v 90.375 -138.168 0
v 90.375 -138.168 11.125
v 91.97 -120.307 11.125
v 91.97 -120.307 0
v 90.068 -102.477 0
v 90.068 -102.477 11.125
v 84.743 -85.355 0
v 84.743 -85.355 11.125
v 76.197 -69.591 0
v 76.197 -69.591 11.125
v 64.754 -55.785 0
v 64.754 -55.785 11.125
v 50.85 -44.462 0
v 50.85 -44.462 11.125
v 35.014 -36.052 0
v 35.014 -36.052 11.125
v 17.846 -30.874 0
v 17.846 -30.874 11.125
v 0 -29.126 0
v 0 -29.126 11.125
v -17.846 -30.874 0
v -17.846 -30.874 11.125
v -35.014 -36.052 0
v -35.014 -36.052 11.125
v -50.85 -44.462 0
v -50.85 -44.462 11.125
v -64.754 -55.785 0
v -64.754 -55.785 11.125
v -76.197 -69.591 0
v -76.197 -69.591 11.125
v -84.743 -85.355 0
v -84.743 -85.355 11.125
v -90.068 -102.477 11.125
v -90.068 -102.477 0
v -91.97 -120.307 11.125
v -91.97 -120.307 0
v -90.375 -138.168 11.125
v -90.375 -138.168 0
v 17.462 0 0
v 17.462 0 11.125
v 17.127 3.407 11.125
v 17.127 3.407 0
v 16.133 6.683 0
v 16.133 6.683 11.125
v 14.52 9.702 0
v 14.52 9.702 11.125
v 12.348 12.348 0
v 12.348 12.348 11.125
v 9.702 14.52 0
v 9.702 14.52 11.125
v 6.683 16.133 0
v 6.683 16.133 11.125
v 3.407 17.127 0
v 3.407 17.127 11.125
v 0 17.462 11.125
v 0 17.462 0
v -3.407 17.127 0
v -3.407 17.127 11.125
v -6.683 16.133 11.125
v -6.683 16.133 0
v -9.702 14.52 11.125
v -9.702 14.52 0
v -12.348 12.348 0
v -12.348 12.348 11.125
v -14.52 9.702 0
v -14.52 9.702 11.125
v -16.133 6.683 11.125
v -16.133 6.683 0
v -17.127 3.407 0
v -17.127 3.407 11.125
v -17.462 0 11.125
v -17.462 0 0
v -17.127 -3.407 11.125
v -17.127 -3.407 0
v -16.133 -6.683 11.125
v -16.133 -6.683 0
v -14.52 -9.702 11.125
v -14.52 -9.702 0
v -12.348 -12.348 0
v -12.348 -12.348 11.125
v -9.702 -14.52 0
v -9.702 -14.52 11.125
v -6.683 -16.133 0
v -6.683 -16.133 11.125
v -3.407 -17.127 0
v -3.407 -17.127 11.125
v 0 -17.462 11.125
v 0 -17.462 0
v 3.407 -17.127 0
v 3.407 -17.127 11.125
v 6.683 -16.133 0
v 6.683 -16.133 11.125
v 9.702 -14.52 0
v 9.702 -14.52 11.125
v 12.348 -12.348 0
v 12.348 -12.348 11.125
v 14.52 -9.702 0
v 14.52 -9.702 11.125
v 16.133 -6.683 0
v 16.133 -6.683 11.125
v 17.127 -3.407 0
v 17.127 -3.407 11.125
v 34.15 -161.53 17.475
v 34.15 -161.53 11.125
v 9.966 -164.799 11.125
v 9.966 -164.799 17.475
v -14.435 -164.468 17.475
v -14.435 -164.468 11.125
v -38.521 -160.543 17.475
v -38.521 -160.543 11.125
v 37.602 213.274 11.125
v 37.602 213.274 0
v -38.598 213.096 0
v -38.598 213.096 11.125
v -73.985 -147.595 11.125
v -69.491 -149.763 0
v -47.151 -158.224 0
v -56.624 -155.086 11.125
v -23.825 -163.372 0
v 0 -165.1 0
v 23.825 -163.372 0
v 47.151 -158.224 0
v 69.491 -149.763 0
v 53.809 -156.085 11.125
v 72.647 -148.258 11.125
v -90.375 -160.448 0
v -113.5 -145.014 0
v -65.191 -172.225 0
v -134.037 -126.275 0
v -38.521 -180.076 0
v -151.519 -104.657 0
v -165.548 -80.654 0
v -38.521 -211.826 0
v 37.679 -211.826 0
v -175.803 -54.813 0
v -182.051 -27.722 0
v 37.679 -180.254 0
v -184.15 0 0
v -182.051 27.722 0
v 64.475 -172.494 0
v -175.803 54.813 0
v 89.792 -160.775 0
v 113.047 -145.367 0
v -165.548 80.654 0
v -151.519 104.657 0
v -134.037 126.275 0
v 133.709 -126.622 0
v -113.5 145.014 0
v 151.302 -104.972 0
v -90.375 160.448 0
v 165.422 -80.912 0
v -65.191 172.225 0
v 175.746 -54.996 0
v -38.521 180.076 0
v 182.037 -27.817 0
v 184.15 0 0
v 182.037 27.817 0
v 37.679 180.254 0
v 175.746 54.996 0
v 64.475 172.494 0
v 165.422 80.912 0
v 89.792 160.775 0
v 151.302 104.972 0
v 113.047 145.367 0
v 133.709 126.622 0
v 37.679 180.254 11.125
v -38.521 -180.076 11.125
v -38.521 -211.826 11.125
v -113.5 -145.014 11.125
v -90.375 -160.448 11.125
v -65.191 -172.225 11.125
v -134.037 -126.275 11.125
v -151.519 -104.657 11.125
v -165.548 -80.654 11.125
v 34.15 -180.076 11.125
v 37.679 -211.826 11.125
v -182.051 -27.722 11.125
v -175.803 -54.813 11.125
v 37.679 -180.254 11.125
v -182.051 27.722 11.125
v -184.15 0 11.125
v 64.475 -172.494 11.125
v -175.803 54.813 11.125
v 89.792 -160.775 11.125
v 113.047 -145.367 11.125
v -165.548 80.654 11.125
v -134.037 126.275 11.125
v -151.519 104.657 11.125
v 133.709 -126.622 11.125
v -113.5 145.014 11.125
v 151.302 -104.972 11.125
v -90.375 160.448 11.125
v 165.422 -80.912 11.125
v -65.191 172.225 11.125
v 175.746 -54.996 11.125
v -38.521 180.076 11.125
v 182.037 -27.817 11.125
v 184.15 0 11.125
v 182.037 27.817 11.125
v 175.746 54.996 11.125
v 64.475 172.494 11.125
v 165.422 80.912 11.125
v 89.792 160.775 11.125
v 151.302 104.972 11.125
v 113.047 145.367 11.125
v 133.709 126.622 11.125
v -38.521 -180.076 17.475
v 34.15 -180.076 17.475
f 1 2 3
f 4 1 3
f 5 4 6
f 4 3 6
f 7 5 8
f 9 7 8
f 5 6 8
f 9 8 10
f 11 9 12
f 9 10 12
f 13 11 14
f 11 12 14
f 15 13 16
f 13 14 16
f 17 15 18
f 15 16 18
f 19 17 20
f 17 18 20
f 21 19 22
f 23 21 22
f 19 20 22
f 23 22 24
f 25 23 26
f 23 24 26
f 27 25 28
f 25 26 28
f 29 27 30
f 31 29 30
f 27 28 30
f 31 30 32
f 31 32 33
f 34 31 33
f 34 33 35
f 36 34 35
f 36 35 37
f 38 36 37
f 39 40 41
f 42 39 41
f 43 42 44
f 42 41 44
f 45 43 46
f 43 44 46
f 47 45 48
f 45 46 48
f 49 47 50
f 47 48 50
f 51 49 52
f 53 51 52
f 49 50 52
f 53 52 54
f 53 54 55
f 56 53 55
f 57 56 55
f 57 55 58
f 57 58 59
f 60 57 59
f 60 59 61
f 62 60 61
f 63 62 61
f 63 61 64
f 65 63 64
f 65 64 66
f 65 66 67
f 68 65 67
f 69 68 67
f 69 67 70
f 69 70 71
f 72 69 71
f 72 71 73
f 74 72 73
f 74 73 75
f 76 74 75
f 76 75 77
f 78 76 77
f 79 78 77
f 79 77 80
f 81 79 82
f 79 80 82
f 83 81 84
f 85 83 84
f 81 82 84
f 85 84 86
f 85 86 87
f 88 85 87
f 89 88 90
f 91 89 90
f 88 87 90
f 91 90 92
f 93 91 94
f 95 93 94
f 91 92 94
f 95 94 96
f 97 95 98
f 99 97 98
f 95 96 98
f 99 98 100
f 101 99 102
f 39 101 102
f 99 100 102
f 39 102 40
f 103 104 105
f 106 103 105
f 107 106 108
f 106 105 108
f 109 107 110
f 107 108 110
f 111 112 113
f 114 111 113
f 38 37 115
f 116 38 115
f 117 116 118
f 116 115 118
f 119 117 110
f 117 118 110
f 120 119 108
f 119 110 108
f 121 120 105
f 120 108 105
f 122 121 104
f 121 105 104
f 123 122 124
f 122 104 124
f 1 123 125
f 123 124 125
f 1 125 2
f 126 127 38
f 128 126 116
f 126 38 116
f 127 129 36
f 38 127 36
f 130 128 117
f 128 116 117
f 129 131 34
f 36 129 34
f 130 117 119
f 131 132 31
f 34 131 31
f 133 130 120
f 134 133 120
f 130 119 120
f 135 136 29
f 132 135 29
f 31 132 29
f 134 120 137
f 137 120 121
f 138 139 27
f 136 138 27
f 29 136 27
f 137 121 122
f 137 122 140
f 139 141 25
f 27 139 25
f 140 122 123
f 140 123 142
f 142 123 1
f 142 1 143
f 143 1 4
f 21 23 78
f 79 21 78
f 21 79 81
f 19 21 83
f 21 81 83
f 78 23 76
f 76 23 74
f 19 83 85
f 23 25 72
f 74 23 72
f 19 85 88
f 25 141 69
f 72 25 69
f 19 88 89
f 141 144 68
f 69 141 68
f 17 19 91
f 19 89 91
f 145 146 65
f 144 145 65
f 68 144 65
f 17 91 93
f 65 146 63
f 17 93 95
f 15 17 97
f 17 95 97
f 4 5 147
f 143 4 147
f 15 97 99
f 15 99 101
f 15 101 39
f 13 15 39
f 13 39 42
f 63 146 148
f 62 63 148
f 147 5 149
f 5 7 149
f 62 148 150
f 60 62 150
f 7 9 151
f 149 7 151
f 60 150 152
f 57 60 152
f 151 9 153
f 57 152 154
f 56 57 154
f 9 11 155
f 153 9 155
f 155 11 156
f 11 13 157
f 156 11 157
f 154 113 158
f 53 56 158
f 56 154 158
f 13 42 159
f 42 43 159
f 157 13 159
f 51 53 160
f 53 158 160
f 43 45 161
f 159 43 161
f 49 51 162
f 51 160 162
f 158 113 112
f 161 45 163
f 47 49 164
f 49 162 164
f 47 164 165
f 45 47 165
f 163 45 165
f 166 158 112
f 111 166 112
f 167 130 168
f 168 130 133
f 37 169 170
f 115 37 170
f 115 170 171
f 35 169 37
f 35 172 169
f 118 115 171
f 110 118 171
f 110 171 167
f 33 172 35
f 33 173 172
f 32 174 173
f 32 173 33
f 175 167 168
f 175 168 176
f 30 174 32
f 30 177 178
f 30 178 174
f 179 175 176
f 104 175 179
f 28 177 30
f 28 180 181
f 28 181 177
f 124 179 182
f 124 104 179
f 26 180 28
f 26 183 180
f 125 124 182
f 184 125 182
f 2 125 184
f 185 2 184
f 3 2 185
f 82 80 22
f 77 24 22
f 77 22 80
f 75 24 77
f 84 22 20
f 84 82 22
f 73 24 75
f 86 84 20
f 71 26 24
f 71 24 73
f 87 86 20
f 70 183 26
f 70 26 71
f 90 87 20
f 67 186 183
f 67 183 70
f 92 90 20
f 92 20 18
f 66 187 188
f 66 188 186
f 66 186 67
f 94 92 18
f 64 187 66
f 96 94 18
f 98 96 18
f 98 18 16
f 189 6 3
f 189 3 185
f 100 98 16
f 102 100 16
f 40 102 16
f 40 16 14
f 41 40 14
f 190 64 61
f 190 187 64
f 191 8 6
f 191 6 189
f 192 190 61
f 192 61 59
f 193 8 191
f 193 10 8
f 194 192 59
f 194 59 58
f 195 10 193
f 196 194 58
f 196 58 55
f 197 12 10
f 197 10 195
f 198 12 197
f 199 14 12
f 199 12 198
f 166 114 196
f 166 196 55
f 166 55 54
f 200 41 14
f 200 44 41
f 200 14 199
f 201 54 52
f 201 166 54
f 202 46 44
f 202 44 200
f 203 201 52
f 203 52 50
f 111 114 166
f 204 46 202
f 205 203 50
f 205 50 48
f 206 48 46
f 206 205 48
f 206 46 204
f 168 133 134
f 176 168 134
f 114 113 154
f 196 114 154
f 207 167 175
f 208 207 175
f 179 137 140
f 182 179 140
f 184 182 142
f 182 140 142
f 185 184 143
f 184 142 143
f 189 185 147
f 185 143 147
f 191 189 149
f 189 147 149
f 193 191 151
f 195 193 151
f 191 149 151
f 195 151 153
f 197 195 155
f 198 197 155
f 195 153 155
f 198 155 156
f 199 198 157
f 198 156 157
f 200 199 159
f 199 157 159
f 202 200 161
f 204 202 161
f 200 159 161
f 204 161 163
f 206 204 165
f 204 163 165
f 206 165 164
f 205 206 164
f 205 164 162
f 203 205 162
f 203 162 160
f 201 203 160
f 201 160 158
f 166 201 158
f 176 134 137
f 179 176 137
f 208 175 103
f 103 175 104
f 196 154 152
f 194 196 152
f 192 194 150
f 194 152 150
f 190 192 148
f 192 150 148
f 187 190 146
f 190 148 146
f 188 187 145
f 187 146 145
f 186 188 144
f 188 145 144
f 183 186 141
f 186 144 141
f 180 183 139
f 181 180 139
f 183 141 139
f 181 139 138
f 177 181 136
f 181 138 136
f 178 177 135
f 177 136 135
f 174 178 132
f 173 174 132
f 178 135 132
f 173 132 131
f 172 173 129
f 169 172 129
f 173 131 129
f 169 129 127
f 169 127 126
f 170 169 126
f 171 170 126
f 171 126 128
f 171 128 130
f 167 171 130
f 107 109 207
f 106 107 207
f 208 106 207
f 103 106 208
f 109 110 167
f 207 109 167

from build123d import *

# Parameters (mm, degrees)
BOSS_EXTRUDE1_DEPTH = 11.1252
SKETCH5_R           = 17.4625
CUT_EXTRUDE1_DEPTH  = 12.7
CUT_EXTRUDE4_DEPTH  = 12.7
BOSS_EXTRUDE2_START = 6.35
BOSS_EXTRUDE2_DEPTH = 6.35


with BuildPart() as part:
    # Sketch1 → Boss-Extrude1 (new body)
    with BuildSketch(Plane.XY):
        with BuildLine():
            Line((-38.598020157, 213.095995412), (-38.52088234, 180.075995412))
            ThreePointArc((-38.52088234, 180.075995412), (-184.15, 0), (-38.52088234, -180.075995412))
            Line((-38.52088234, -180.075995412), (-38.52088234, -211.825995412))
            Line((-38.52088234, -211.825995412), (37.67911766, -211.825995412))
            Line((37.67911766, -211.825995412), (37.67911766, -180.254005759))
            ThreePointArc((37.67911766, -180.254005759), (184.15, 0), (37.67911766, 180.254005759))
            Line((37.67911766, 180.254005759), (37.601979843, 213.274005759))
            Line((37.601979843, 213.274005759), (-38.598020157, 213.095995412))
        make_face()
    extrude(amount=BOSS_EXTRUDE1_DEPTH)

    # Sketch5 → Cut-Extrude1 (cut)
    with BuildSketch(Plane.XY.offset(11.1252)):
        Circle(SKETCH5_R)
    extrude(amount=-CUT_EXTRUDE1_DEPTH, mode=Mode.SUBTRACT)

    # Sketch6 → Cut-Extrude4 (cut)
    with BuildSketch(Plane.XY.offset(11.1252)):
        with BuildLine():
            ThreePointArc((90.375326038, -138.167689579), (0, -29.126312042), (-90.375326038, -138.167689579))
            ThreePointArc((-90.375326038, -138.167689579), (0, -165.1), (90.375326038, -138.167689579))
        make_face()
    extrude(amount=-CUT_EXTRUDE4_DEPTH, mode=Mode.SUBTRACT)

    # Sketch7 → Boss-Extrude2 (add)
    with BuildSketch(Plane.XY.offset(11.1252).offset(BOSS_EXTRUDE2_START)):
        with BuildLine():
            Line((-38.52088234, -160.543301398), (-38.52088234, -180.075995412))
            Line((-38.52088234, -180.075995412), (34.149976763, -180.075995412))
            Line((34.149976763, -180.075995412), (34.149976763, -161.529530078))
            ThreePointArc((34.149976763, -161.529530078), (-2.240394082, -165.084798314), (-38.52088234, -160.543301398))
        make_face()
    extrude(amount=-BOSS_EXTRUDE2_DEPTH)


solid = part.part
